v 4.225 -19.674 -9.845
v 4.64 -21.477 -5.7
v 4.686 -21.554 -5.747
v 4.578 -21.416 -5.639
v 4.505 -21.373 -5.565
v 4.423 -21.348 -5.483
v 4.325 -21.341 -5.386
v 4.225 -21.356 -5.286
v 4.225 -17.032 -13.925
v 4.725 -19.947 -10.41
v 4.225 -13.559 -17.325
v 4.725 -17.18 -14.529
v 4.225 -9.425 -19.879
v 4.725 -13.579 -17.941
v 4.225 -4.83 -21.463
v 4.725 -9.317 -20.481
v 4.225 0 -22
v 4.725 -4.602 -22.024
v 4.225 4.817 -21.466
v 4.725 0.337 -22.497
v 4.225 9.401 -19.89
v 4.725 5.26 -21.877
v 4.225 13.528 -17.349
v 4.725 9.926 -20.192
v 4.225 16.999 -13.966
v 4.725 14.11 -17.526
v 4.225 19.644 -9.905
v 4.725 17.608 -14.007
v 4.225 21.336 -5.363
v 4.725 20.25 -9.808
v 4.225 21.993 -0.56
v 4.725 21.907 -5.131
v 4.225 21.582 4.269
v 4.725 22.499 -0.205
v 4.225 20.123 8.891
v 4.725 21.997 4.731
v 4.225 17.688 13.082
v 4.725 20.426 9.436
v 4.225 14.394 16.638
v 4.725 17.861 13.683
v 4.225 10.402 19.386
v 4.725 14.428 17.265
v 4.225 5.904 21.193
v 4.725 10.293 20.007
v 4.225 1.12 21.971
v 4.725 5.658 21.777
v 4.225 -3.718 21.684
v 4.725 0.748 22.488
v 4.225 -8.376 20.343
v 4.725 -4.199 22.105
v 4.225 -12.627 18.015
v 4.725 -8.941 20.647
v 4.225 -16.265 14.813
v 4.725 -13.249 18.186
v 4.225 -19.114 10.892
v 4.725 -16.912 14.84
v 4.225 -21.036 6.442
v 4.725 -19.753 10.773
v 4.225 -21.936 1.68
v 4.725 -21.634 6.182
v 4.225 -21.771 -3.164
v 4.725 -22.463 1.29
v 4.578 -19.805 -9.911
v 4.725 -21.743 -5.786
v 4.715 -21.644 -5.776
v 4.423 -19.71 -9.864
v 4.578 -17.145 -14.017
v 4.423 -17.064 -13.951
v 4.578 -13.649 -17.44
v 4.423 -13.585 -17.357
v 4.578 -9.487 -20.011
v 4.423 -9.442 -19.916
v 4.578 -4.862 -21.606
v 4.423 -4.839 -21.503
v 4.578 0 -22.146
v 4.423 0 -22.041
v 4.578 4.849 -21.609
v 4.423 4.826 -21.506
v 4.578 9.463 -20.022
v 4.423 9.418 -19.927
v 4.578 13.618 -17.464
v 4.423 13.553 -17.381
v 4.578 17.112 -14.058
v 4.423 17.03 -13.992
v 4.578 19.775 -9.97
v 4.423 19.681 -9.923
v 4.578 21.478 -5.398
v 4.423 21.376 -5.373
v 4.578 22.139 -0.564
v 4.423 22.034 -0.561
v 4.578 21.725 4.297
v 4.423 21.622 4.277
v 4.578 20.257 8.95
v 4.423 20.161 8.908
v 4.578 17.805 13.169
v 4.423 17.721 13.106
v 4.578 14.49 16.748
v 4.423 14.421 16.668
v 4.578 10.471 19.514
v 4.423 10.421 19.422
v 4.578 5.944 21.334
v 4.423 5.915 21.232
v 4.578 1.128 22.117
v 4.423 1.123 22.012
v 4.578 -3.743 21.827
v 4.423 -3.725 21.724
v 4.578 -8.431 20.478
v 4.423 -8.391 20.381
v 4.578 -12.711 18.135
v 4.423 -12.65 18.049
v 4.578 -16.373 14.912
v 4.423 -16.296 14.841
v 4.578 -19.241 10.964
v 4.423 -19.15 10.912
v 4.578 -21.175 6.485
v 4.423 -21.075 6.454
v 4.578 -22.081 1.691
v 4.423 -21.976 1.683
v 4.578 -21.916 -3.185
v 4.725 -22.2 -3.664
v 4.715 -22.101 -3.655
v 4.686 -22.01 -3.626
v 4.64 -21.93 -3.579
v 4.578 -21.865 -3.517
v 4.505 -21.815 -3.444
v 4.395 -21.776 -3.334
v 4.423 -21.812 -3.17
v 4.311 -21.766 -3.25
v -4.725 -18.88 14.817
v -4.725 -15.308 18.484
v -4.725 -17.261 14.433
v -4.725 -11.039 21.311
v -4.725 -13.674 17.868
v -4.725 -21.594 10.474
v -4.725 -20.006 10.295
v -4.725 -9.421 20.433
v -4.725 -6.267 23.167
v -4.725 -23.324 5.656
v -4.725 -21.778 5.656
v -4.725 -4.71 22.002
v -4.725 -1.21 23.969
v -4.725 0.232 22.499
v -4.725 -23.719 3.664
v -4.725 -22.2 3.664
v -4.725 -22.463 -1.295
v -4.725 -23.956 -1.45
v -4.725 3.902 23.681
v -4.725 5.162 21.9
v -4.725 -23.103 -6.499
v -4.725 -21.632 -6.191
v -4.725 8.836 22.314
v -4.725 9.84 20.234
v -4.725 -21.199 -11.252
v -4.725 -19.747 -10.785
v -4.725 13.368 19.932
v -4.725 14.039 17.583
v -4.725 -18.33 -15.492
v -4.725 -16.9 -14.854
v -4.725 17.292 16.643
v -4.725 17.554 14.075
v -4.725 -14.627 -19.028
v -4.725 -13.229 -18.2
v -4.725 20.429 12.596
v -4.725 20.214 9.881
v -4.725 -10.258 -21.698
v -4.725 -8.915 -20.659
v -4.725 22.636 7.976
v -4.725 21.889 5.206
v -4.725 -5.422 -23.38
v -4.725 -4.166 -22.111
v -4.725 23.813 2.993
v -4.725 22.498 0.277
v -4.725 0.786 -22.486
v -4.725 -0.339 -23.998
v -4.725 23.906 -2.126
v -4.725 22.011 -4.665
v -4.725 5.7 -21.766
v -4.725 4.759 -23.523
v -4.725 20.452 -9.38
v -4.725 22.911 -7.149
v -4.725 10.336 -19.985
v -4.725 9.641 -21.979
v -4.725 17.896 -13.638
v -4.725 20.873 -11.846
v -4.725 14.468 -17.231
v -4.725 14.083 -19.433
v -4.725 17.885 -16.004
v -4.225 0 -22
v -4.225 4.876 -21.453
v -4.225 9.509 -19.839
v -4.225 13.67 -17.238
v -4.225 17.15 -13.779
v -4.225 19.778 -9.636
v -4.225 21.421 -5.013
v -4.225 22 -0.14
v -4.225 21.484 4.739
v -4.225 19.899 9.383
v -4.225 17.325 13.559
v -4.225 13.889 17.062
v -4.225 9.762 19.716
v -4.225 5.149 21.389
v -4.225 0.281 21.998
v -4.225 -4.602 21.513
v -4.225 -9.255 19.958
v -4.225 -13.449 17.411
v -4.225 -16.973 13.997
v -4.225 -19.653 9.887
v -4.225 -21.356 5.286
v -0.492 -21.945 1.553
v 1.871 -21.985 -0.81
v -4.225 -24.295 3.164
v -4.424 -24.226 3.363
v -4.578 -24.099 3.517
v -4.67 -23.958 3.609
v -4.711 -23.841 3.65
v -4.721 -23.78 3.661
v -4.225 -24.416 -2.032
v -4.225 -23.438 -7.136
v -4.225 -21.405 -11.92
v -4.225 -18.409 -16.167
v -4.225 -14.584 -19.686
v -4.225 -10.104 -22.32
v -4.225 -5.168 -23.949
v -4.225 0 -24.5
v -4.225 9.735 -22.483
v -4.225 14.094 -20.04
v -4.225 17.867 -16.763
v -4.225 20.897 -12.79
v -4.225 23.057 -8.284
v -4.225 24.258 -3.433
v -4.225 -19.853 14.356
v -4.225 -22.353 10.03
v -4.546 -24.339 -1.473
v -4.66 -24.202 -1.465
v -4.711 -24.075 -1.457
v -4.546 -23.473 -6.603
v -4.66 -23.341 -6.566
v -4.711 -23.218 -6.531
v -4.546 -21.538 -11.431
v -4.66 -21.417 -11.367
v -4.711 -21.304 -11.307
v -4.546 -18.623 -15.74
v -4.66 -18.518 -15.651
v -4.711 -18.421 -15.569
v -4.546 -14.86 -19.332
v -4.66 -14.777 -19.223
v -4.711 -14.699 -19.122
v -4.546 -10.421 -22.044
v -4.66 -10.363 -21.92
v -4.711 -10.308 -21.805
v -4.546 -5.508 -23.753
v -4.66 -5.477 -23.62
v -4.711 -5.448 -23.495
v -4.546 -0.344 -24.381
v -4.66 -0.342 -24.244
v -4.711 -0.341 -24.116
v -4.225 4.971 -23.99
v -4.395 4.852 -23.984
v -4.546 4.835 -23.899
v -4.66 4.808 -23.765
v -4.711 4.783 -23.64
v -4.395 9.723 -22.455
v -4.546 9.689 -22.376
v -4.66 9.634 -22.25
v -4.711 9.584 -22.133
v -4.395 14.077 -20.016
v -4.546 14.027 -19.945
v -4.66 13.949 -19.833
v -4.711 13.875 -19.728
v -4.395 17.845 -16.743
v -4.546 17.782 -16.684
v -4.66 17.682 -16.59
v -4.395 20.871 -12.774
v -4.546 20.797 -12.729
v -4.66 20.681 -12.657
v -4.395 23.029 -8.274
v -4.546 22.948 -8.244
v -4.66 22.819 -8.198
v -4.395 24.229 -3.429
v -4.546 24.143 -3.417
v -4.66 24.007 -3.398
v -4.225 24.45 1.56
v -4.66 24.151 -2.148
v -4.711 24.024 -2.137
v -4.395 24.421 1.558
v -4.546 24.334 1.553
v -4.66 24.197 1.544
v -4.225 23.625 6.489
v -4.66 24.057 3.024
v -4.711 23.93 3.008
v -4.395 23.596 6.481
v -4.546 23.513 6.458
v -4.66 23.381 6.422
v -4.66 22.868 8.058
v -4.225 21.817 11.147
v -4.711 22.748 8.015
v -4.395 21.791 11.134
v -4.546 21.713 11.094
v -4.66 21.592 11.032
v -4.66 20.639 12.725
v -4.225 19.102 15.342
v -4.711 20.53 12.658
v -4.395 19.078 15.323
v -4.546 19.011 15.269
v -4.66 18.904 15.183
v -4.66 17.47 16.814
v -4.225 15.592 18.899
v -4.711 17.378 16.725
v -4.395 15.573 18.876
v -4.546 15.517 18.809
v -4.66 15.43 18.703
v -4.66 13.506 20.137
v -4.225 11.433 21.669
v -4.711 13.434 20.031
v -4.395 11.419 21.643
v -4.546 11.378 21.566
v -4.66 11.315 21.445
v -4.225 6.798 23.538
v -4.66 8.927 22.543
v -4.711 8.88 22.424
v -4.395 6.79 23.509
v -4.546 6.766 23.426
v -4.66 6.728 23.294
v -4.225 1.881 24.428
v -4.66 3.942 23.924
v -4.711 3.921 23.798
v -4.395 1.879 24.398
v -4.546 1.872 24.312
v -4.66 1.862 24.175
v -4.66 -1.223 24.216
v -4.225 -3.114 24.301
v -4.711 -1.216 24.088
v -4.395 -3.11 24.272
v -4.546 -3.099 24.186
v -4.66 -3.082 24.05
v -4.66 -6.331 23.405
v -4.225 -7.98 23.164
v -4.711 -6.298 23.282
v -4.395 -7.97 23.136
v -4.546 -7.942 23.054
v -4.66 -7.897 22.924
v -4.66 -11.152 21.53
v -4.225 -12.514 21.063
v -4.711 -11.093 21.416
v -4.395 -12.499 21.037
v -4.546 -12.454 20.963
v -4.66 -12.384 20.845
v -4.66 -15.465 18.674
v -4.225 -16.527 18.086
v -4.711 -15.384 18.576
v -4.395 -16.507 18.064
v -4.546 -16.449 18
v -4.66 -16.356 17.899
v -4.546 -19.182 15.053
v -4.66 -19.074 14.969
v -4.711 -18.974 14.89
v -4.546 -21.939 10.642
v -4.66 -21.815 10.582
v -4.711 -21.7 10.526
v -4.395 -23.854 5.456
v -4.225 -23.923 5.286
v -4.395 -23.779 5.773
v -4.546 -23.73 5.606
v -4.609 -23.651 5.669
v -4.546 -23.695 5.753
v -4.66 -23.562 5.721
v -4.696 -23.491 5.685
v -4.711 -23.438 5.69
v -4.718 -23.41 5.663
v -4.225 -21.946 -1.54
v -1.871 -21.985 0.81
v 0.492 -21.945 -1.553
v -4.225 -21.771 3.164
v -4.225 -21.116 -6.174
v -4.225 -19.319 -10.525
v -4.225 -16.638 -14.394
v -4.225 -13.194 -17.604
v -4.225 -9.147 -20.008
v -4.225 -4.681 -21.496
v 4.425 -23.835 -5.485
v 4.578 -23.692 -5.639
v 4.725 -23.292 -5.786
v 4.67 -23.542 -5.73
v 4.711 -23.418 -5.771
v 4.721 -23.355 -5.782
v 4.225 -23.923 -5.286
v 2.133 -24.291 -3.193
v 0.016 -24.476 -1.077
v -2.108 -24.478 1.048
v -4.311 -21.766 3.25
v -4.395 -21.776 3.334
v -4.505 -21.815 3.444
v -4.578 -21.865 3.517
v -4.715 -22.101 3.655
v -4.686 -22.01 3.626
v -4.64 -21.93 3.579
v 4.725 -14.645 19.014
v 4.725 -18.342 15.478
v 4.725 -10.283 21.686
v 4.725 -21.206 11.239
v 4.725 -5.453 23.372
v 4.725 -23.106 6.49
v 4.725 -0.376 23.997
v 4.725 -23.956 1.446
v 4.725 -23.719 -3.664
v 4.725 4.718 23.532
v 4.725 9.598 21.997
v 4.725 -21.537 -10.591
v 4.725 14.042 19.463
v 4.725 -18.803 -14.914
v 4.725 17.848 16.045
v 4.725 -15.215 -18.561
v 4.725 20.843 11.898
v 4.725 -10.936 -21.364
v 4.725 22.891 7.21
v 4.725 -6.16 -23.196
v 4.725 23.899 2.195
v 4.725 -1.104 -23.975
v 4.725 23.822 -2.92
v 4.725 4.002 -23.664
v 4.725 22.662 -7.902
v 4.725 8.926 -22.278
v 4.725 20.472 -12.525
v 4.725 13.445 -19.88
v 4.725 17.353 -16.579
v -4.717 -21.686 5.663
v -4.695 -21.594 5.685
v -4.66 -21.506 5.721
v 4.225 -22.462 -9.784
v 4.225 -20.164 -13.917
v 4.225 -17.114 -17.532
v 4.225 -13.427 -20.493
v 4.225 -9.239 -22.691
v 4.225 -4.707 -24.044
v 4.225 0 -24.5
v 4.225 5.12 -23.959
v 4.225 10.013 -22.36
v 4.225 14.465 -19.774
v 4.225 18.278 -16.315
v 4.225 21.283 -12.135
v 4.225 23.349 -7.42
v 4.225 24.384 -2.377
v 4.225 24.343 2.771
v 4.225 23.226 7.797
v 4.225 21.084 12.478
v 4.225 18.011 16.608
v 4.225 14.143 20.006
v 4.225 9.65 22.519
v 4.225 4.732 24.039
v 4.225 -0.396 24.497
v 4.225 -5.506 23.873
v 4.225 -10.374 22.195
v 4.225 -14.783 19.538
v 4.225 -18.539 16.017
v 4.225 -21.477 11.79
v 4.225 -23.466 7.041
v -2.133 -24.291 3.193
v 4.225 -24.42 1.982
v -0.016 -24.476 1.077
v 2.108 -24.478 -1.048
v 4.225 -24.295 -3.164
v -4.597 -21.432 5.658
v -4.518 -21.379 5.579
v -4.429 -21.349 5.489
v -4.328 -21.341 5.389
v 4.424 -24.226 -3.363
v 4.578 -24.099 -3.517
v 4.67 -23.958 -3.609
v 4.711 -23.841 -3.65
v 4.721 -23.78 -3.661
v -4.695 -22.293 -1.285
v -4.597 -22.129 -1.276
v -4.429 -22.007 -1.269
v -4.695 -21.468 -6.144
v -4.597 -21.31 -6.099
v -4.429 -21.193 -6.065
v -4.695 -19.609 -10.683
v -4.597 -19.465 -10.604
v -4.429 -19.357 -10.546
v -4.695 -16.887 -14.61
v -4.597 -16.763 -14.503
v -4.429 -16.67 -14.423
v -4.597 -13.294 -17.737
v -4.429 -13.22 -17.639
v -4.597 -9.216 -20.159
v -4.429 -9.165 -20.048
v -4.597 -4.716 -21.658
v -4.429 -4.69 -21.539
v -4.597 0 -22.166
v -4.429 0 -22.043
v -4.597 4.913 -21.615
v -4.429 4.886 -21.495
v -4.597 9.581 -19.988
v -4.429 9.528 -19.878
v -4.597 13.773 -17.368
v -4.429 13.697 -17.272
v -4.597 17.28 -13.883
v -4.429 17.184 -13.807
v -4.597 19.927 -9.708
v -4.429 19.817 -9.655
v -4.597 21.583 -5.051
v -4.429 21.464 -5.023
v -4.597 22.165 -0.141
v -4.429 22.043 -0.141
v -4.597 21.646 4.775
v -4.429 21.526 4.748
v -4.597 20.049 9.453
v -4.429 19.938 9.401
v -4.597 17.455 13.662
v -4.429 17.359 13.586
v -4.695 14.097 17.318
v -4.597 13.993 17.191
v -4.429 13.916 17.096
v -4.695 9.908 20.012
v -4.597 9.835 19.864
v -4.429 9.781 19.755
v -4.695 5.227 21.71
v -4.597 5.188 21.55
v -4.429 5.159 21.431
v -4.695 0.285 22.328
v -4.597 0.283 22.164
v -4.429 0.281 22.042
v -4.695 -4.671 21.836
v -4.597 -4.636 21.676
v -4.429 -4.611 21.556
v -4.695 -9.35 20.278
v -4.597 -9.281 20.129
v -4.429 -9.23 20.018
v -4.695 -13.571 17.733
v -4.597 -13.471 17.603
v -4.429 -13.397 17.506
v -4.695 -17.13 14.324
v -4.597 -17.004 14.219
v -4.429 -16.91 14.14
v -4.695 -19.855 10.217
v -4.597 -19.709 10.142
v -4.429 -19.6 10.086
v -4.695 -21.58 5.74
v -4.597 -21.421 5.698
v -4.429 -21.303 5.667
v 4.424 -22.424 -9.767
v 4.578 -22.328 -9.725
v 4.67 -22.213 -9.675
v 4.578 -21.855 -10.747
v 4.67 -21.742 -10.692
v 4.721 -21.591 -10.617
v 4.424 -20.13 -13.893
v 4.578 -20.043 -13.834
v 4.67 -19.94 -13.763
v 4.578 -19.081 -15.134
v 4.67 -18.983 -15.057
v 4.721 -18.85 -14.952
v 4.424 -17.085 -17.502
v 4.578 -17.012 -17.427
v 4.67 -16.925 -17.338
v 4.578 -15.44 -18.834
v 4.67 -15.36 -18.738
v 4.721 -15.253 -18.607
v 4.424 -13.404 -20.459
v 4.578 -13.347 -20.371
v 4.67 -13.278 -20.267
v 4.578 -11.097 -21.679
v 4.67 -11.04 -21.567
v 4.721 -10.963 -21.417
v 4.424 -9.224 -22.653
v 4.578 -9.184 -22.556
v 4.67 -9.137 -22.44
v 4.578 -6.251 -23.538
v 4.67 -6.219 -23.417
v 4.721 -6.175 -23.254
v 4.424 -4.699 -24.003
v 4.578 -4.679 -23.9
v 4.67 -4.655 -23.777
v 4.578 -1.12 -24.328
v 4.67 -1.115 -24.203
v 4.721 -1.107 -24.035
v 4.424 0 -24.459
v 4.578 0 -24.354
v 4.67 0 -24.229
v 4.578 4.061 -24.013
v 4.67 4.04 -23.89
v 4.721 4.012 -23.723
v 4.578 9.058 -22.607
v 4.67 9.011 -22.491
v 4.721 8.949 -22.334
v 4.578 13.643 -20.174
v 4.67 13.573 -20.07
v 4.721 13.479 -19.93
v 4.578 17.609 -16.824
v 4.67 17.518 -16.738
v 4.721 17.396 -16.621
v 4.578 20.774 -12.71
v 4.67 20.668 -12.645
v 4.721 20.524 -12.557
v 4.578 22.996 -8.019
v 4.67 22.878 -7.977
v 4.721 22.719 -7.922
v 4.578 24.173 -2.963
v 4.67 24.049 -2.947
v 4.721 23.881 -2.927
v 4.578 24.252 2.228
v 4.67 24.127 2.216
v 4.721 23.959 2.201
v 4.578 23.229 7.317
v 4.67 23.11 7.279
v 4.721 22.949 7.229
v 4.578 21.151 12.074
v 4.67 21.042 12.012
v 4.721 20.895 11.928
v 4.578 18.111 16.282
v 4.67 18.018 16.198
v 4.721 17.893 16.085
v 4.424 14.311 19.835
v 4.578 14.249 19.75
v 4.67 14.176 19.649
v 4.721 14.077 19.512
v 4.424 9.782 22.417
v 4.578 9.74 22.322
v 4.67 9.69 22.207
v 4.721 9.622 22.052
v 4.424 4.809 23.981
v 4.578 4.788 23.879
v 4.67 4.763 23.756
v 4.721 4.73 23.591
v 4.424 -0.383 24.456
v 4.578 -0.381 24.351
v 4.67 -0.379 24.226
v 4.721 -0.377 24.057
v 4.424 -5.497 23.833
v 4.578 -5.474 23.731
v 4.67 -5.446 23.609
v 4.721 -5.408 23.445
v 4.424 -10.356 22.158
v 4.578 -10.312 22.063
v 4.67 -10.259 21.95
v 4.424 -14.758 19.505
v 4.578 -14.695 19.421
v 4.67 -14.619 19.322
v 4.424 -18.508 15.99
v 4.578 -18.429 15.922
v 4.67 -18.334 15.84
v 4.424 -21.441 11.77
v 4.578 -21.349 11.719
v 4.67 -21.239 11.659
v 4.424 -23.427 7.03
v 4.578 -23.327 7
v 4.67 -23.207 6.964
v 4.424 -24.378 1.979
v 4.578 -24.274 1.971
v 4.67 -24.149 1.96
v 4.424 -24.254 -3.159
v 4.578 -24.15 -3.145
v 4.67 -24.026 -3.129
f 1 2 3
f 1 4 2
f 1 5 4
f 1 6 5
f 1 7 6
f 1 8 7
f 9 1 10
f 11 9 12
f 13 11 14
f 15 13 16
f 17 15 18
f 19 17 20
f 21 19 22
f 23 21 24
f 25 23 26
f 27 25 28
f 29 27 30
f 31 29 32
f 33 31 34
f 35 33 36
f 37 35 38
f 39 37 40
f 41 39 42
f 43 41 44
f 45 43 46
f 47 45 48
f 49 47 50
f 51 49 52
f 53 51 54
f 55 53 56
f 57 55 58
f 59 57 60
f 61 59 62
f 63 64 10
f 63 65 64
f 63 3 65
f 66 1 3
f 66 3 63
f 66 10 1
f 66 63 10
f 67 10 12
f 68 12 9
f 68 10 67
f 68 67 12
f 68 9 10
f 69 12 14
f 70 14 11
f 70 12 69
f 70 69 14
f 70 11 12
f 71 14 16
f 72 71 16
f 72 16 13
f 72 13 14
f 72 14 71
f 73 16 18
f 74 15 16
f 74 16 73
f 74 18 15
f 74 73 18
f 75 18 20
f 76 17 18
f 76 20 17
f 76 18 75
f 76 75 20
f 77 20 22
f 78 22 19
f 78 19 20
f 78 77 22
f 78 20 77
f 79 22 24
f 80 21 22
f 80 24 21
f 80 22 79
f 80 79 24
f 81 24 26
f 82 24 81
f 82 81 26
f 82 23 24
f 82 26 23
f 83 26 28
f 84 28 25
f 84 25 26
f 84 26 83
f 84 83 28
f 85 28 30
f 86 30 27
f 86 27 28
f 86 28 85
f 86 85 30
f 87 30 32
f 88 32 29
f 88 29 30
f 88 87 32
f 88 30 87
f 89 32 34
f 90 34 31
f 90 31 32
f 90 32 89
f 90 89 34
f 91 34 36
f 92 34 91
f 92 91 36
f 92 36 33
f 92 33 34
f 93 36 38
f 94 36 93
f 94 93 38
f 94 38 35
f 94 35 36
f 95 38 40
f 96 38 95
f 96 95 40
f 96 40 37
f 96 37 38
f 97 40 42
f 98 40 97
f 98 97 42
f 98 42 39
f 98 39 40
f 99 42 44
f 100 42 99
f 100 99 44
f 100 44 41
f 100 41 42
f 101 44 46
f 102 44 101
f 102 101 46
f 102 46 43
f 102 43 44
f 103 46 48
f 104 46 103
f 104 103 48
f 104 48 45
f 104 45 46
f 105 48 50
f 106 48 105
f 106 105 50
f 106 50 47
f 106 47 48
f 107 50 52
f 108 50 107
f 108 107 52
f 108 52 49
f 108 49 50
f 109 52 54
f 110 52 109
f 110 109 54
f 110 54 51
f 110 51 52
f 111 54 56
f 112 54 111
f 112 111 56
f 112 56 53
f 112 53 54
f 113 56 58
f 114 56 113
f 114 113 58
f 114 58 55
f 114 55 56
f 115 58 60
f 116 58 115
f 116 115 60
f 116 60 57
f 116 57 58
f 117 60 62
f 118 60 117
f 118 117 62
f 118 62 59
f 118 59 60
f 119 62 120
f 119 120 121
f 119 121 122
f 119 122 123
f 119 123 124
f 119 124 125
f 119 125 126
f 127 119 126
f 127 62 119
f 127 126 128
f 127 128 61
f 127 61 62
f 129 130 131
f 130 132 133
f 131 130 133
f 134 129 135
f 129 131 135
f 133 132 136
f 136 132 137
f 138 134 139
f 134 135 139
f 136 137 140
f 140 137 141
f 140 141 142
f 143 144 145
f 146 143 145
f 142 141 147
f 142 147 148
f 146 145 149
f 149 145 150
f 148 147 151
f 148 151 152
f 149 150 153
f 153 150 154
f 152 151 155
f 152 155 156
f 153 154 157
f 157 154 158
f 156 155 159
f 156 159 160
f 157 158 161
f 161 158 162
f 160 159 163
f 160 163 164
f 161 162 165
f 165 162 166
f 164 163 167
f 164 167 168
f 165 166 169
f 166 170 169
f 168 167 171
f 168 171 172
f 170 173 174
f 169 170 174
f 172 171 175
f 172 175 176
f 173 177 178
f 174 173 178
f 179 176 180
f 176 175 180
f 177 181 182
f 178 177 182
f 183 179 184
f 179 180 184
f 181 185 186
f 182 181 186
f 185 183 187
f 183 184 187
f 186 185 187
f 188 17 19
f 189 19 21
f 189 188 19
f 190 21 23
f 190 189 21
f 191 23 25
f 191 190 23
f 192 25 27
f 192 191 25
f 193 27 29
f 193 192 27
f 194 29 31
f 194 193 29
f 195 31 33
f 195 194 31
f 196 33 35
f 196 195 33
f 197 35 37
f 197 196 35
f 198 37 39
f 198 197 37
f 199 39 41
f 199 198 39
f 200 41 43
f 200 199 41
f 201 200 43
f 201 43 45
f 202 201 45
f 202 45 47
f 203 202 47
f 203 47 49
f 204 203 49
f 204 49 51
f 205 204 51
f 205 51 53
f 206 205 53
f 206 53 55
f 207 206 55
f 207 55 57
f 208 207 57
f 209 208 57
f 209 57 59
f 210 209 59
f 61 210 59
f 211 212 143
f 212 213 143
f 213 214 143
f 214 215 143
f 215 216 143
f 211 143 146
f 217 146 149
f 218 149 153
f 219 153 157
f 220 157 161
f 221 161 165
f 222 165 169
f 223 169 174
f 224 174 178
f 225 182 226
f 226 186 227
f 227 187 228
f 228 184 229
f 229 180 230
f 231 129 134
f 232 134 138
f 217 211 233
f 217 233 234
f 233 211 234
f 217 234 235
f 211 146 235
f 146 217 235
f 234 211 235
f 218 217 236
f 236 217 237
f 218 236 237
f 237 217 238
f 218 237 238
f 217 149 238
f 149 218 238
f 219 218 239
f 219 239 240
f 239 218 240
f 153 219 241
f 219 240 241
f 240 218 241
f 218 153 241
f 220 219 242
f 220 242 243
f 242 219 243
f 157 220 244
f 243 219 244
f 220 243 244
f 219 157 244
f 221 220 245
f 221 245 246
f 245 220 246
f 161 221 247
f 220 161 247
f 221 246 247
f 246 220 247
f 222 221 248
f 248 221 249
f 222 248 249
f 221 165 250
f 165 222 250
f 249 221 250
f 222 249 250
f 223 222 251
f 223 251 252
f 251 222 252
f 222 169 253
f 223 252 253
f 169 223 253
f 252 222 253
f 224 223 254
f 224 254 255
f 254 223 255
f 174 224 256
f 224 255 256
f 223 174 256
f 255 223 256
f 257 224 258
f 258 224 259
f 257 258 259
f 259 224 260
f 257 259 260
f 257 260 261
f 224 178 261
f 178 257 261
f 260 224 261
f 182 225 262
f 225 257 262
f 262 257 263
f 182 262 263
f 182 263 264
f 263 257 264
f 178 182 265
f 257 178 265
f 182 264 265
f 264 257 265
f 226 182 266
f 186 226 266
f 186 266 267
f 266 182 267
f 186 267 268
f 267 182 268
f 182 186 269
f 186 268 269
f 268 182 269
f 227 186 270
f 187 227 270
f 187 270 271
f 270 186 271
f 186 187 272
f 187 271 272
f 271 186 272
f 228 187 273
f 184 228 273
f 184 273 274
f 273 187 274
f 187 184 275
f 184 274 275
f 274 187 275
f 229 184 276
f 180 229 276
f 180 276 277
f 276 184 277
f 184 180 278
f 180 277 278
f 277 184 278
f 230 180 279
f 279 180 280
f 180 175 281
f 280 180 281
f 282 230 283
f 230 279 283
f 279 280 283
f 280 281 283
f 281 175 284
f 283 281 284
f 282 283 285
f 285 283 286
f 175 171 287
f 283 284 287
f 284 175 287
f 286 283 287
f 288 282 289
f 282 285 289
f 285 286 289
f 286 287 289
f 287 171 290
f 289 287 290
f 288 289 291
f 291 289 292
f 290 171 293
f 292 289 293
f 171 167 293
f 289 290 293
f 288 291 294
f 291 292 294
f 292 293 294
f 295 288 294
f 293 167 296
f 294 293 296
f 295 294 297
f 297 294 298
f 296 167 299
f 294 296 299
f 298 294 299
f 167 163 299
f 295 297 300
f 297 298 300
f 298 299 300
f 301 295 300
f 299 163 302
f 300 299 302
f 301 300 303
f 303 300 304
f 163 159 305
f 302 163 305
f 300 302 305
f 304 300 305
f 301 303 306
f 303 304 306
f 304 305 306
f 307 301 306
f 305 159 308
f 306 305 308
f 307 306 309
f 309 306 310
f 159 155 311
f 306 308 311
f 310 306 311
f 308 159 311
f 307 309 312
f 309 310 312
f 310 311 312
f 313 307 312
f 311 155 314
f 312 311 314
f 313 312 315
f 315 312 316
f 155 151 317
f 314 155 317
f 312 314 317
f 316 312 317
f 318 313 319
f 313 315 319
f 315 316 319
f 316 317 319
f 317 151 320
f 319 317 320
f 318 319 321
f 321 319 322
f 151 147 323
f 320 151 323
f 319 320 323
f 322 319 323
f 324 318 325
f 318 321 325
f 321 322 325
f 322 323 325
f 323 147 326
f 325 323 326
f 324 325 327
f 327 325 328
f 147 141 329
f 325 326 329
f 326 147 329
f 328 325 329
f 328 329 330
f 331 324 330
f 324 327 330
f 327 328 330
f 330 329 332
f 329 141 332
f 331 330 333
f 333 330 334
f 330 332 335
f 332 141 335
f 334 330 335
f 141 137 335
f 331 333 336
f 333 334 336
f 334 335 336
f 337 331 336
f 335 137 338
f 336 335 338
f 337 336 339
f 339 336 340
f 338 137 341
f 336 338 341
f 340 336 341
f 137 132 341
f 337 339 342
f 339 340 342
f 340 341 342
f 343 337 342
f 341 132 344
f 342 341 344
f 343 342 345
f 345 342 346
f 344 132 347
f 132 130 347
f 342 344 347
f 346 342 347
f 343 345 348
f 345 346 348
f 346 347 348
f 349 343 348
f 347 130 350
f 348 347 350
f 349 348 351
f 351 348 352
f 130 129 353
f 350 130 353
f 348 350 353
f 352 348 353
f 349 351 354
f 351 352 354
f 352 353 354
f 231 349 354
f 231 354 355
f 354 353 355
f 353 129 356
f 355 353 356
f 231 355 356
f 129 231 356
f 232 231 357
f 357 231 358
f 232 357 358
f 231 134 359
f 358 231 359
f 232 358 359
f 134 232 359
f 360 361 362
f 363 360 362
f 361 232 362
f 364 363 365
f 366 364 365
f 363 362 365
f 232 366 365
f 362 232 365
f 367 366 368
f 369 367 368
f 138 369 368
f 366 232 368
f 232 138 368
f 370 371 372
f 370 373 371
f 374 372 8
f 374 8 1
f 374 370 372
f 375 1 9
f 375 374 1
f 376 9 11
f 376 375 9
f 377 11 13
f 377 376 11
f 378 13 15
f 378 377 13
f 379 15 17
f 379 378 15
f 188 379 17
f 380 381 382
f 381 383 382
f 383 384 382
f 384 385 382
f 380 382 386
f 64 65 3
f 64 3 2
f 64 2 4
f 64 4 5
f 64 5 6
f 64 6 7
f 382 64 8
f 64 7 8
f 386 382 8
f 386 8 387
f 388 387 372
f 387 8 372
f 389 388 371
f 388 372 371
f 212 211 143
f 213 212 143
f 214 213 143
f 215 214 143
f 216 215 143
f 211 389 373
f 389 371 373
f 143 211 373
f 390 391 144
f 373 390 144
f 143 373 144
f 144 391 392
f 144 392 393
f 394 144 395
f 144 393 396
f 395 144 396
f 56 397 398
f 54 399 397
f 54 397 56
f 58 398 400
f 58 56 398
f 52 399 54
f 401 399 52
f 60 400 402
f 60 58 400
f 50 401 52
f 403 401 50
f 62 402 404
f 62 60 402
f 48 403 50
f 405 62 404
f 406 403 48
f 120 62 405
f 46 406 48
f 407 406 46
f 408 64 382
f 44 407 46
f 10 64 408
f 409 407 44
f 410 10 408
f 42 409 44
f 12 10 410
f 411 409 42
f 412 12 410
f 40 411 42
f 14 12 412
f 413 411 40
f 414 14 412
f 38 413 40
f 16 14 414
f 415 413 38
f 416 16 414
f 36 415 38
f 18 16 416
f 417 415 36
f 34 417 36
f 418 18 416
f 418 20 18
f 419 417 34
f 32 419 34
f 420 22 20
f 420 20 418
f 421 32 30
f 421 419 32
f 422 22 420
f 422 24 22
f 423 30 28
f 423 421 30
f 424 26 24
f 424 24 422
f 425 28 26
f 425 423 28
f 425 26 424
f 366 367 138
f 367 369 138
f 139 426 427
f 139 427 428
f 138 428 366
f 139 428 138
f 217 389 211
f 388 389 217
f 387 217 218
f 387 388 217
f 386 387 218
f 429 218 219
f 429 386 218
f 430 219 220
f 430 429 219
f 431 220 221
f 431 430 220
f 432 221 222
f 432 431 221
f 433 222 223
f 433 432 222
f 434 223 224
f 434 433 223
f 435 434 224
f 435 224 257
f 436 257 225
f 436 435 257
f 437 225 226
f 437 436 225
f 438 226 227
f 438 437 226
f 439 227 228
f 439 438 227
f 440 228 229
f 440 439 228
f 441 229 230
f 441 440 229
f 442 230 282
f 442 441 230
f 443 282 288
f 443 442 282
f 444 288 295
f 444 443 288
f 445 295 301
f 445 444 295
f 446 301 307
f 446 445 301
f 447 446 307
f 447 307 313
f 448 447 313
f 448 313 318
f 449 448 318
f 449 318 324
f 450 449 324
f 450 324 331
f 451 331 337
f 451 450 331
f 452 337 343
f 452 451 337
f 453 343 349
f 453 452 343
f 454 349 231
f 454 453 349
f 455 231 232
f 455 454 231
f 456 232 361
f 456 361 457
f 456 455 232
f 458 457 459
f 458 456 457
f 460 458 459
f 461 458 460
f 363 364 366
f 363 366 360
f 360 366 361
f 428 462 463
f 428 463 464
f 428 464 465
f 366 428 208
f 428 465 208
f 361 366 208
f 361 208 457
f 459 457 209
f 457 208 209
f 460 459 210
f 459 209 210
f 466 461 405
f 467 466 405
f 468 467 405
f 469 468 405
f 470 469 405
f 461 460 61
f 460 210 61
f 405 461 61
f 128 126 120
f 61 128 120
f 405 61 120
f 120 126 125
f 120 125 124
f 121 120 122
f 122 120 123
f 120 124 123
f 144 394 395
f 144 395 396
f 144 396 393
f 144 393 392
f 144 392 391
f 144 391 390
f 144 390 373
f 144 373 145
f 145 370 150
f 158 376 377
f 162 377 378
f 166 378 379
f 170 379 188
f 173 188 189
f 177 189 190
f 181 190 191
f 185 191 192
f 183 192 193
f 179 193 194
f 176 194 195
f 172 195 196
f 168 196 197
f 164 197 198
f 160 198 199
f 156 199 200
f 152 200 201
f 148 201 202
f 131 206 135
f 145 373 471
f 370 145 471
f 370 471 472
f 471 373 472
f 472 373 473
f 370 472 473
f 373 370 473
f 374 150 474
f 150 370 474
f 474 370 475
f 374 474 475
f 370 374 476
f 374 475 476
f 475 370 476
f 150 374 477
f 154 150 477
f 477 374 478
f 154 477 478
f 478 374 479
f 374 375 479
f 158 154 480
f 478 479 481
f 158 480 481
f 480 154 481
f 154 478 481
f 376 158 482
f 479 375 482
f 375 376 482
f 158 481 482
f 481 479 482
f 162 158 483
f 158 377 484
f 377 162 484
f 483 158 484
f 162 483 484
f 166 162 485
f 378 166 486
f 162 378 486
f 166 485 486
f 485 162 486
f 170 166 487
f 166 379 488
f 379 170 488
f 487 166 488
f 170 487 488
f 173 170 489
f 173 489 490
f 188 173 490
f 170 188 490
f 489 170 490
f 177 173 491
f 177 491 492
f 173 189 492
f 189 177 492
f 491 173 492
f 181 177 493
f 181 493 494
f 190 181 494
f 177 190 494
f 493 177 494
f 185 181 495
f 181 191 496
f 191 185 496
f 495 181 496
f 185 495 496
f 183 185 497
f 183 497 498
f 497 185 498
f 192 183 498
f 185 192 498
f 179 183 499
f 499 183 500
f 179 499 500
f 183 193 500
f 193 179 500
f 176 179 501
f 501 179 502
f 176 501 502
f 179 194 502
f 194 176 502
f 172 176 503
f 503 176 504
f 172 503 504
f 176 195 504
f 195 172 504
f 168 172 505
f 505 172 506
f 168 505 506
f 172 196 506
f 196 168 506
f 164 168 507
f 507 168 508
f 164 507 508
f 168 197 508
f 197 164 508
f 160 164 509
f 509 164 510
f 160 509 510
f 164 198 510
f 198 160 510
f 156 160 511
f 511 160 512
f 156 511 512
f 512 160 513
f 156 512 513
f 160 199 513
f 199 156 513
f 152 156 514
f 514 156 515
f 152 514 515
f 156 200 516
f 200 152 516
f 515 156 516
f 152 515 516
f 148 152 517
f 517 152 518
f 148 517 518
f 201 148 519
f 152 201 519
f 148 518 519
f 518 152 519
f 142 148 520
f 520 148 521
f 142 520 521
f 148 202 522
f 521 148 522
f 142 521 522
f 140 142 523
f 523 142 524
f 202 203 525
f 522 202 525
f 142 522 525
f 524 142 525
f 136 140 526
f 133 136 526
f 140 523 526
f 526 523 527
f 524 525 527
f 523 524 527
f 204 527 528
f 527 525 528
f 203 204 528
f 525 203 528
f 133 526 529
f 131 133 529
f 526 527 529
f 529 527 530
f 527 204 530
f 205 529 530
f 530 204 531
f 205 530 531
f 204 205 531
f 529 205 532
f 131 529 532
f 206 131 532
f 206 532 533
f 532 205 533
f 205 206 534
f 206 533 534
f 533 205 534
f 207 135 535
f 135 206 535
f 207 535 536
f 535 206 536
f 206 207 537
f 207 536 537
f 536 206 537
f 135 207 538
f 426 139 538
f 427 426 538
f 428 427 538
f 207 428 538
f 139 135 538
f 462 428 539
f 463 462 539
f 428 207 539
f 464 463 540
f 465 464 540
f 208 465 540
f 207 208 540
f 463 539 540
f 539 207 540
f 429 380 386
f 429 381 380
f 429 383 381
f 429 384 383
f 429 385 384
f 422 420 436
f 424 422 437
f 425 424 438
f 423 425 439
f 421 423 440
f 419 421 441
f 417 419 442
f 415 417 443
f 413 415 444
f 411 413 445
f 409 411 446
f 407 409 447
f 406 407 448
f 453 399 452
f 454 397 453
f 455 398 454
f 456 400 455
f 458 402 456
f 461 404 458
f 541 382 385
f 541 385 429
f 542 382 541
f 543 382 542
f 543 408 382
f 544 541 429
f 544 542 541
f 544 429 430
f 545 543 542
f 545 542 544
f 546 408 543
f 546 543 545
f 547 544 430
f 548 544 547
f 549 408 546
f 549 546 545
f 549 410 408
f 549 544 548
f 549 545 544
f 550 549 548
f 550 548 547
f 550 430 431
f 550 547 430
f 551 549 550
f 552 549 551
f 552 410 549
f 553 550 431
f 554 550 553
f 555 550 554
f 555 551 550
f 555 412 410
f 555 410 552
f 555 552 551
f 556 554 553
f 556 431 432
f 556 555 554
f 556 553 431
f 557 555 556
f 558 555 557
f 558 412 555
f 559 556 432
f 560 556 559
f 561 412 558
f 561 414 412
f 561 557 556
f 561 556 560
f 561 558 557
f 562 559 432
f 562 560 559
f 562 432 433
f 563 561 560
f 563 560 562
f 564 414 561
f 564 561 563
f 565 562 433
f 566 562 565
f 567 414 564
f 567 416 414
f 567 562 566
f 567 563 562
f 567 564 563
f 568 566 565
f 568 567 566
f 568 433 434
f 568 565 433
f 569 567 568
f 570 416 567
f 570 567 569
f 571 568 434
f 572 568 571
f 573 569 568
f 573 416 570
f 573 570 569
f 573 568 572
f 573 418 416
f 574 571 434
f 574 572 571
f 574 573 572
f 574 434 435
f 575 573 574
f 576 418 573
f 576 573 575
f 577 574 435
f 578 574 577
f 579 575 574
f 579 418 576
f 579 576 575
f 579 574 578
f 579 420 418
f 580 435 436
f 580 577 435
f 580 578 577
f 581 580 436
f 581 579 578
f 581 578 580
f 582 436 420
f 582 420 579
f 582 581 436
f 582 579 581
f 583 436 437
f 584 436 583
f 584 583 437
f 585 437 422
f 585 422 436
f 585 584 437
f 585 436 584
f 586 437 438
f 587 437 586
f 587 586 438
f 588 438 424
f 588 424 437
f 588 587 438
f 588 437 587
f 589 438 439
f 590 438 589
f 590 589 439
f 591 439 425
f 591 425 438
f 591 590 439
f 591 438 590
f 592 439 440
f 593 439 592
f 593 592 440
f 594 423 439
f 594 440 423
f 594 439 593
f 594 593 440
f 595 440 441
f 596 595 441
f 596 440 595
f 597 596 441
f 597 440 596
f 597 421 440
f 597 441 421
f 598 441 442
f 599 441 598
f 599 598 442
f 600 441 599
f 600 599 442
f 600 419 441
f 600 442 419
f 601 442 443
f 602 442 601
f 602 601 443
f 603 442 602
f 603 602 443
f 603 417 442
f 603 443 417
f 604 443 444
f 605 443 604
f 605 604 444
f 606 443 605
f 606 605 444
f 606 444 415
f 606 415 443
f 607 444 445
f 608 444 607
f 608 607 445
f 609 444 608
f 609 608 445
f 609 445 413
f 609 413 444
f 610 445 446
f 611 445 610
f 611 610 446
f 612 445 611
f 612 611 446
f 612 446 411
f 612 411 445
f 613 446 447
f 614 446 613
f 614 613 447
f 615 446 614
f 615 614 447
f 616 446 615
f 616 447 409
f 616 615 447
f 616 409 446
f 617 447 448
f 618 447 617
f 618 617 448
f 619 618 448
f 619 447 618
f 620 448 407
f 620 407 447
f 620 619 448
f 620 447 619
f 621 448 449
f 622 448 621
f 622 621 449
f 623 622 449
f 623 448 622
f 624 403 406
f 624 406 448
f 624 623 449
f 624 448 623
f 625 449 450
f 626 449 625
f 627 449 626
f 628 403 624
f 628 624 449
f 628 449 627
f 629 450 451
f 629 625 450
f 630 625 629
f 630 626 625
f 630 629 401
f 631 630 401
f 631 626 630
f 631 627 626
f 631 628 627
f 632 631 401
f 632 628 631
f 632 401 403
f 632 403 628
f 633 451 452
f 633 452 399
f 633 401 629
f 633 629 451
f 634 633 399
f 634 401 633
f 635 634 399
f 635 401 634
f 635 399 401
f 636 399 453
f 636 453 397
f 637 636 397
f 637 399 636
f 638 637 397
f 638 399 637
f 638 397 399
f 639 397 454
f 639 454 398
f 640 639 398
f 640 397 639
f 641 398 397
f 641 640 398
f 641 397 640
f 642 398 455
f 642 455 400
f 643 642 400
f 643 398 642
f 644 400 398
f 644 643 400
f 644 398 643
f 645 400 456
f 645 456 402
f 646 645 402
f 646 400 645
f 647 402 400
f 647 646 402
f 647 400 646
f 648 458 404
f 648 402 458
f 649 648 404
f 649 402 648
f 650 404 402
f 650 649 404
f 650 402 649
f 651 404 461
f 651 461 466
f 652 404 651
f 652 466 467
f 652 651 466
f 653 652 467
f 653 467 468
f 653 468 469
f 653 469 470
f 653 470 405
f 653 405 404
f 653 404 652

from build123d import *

# Parameters (mm, degrees)
SKETCH1_R      = 24.5
SKETCH1_R_2    = 22
EXTRUDE1_DEPTH = 4.725
EXTRUDE2_DEPTH = 35.968923704
FILLET1_R      = 0.5


with BuildPart() as part:
    # Sketch1 → Extrude1 (new, symmetric)
    with BuildSketch(Plane(origin=(0, 0, 0), x_dir=(0, 0, -1), z_dir=(1, 0, 0))):
        Circle(SKETCH1_R)
        Circle(SKETCH1_R_2, mode=Mode.SUBTRACT)
    extrude(amount=EXTRUDE1_DEPTH, both=True)

    # Sketch2 → Extrude2 (cut, through all)
    with BuildSketch(Plane(origin=(0, 0, 0), x_dir=(1, 0, 0), z_dir=(0, 1, 0))):
        Polygon((4.725, 5.785660172), (-5.720642465, -4.659982293), (-4.659982293, -5.720642465), (5.785660172, 4.725), align=None)
    extrude(amount=-EXTRUDE2_DEPTH, mode=Mode.SUBTRACT)

    # Fillet1
    fillet1_edges = [part.edges().sort_by_distance(p)[0] for p in [
        (-4.725, 19.219948056, 15.193537992),
        (-4.725, 17.441670572, 13.408509524),
        (4.725, 14.201840088, 16.802015894),
        (4.725, 15.976133359, 18.574529951),
    ]]
    fillet(fillet1_edges, radius=FILLET1_R)


solid = part.part
